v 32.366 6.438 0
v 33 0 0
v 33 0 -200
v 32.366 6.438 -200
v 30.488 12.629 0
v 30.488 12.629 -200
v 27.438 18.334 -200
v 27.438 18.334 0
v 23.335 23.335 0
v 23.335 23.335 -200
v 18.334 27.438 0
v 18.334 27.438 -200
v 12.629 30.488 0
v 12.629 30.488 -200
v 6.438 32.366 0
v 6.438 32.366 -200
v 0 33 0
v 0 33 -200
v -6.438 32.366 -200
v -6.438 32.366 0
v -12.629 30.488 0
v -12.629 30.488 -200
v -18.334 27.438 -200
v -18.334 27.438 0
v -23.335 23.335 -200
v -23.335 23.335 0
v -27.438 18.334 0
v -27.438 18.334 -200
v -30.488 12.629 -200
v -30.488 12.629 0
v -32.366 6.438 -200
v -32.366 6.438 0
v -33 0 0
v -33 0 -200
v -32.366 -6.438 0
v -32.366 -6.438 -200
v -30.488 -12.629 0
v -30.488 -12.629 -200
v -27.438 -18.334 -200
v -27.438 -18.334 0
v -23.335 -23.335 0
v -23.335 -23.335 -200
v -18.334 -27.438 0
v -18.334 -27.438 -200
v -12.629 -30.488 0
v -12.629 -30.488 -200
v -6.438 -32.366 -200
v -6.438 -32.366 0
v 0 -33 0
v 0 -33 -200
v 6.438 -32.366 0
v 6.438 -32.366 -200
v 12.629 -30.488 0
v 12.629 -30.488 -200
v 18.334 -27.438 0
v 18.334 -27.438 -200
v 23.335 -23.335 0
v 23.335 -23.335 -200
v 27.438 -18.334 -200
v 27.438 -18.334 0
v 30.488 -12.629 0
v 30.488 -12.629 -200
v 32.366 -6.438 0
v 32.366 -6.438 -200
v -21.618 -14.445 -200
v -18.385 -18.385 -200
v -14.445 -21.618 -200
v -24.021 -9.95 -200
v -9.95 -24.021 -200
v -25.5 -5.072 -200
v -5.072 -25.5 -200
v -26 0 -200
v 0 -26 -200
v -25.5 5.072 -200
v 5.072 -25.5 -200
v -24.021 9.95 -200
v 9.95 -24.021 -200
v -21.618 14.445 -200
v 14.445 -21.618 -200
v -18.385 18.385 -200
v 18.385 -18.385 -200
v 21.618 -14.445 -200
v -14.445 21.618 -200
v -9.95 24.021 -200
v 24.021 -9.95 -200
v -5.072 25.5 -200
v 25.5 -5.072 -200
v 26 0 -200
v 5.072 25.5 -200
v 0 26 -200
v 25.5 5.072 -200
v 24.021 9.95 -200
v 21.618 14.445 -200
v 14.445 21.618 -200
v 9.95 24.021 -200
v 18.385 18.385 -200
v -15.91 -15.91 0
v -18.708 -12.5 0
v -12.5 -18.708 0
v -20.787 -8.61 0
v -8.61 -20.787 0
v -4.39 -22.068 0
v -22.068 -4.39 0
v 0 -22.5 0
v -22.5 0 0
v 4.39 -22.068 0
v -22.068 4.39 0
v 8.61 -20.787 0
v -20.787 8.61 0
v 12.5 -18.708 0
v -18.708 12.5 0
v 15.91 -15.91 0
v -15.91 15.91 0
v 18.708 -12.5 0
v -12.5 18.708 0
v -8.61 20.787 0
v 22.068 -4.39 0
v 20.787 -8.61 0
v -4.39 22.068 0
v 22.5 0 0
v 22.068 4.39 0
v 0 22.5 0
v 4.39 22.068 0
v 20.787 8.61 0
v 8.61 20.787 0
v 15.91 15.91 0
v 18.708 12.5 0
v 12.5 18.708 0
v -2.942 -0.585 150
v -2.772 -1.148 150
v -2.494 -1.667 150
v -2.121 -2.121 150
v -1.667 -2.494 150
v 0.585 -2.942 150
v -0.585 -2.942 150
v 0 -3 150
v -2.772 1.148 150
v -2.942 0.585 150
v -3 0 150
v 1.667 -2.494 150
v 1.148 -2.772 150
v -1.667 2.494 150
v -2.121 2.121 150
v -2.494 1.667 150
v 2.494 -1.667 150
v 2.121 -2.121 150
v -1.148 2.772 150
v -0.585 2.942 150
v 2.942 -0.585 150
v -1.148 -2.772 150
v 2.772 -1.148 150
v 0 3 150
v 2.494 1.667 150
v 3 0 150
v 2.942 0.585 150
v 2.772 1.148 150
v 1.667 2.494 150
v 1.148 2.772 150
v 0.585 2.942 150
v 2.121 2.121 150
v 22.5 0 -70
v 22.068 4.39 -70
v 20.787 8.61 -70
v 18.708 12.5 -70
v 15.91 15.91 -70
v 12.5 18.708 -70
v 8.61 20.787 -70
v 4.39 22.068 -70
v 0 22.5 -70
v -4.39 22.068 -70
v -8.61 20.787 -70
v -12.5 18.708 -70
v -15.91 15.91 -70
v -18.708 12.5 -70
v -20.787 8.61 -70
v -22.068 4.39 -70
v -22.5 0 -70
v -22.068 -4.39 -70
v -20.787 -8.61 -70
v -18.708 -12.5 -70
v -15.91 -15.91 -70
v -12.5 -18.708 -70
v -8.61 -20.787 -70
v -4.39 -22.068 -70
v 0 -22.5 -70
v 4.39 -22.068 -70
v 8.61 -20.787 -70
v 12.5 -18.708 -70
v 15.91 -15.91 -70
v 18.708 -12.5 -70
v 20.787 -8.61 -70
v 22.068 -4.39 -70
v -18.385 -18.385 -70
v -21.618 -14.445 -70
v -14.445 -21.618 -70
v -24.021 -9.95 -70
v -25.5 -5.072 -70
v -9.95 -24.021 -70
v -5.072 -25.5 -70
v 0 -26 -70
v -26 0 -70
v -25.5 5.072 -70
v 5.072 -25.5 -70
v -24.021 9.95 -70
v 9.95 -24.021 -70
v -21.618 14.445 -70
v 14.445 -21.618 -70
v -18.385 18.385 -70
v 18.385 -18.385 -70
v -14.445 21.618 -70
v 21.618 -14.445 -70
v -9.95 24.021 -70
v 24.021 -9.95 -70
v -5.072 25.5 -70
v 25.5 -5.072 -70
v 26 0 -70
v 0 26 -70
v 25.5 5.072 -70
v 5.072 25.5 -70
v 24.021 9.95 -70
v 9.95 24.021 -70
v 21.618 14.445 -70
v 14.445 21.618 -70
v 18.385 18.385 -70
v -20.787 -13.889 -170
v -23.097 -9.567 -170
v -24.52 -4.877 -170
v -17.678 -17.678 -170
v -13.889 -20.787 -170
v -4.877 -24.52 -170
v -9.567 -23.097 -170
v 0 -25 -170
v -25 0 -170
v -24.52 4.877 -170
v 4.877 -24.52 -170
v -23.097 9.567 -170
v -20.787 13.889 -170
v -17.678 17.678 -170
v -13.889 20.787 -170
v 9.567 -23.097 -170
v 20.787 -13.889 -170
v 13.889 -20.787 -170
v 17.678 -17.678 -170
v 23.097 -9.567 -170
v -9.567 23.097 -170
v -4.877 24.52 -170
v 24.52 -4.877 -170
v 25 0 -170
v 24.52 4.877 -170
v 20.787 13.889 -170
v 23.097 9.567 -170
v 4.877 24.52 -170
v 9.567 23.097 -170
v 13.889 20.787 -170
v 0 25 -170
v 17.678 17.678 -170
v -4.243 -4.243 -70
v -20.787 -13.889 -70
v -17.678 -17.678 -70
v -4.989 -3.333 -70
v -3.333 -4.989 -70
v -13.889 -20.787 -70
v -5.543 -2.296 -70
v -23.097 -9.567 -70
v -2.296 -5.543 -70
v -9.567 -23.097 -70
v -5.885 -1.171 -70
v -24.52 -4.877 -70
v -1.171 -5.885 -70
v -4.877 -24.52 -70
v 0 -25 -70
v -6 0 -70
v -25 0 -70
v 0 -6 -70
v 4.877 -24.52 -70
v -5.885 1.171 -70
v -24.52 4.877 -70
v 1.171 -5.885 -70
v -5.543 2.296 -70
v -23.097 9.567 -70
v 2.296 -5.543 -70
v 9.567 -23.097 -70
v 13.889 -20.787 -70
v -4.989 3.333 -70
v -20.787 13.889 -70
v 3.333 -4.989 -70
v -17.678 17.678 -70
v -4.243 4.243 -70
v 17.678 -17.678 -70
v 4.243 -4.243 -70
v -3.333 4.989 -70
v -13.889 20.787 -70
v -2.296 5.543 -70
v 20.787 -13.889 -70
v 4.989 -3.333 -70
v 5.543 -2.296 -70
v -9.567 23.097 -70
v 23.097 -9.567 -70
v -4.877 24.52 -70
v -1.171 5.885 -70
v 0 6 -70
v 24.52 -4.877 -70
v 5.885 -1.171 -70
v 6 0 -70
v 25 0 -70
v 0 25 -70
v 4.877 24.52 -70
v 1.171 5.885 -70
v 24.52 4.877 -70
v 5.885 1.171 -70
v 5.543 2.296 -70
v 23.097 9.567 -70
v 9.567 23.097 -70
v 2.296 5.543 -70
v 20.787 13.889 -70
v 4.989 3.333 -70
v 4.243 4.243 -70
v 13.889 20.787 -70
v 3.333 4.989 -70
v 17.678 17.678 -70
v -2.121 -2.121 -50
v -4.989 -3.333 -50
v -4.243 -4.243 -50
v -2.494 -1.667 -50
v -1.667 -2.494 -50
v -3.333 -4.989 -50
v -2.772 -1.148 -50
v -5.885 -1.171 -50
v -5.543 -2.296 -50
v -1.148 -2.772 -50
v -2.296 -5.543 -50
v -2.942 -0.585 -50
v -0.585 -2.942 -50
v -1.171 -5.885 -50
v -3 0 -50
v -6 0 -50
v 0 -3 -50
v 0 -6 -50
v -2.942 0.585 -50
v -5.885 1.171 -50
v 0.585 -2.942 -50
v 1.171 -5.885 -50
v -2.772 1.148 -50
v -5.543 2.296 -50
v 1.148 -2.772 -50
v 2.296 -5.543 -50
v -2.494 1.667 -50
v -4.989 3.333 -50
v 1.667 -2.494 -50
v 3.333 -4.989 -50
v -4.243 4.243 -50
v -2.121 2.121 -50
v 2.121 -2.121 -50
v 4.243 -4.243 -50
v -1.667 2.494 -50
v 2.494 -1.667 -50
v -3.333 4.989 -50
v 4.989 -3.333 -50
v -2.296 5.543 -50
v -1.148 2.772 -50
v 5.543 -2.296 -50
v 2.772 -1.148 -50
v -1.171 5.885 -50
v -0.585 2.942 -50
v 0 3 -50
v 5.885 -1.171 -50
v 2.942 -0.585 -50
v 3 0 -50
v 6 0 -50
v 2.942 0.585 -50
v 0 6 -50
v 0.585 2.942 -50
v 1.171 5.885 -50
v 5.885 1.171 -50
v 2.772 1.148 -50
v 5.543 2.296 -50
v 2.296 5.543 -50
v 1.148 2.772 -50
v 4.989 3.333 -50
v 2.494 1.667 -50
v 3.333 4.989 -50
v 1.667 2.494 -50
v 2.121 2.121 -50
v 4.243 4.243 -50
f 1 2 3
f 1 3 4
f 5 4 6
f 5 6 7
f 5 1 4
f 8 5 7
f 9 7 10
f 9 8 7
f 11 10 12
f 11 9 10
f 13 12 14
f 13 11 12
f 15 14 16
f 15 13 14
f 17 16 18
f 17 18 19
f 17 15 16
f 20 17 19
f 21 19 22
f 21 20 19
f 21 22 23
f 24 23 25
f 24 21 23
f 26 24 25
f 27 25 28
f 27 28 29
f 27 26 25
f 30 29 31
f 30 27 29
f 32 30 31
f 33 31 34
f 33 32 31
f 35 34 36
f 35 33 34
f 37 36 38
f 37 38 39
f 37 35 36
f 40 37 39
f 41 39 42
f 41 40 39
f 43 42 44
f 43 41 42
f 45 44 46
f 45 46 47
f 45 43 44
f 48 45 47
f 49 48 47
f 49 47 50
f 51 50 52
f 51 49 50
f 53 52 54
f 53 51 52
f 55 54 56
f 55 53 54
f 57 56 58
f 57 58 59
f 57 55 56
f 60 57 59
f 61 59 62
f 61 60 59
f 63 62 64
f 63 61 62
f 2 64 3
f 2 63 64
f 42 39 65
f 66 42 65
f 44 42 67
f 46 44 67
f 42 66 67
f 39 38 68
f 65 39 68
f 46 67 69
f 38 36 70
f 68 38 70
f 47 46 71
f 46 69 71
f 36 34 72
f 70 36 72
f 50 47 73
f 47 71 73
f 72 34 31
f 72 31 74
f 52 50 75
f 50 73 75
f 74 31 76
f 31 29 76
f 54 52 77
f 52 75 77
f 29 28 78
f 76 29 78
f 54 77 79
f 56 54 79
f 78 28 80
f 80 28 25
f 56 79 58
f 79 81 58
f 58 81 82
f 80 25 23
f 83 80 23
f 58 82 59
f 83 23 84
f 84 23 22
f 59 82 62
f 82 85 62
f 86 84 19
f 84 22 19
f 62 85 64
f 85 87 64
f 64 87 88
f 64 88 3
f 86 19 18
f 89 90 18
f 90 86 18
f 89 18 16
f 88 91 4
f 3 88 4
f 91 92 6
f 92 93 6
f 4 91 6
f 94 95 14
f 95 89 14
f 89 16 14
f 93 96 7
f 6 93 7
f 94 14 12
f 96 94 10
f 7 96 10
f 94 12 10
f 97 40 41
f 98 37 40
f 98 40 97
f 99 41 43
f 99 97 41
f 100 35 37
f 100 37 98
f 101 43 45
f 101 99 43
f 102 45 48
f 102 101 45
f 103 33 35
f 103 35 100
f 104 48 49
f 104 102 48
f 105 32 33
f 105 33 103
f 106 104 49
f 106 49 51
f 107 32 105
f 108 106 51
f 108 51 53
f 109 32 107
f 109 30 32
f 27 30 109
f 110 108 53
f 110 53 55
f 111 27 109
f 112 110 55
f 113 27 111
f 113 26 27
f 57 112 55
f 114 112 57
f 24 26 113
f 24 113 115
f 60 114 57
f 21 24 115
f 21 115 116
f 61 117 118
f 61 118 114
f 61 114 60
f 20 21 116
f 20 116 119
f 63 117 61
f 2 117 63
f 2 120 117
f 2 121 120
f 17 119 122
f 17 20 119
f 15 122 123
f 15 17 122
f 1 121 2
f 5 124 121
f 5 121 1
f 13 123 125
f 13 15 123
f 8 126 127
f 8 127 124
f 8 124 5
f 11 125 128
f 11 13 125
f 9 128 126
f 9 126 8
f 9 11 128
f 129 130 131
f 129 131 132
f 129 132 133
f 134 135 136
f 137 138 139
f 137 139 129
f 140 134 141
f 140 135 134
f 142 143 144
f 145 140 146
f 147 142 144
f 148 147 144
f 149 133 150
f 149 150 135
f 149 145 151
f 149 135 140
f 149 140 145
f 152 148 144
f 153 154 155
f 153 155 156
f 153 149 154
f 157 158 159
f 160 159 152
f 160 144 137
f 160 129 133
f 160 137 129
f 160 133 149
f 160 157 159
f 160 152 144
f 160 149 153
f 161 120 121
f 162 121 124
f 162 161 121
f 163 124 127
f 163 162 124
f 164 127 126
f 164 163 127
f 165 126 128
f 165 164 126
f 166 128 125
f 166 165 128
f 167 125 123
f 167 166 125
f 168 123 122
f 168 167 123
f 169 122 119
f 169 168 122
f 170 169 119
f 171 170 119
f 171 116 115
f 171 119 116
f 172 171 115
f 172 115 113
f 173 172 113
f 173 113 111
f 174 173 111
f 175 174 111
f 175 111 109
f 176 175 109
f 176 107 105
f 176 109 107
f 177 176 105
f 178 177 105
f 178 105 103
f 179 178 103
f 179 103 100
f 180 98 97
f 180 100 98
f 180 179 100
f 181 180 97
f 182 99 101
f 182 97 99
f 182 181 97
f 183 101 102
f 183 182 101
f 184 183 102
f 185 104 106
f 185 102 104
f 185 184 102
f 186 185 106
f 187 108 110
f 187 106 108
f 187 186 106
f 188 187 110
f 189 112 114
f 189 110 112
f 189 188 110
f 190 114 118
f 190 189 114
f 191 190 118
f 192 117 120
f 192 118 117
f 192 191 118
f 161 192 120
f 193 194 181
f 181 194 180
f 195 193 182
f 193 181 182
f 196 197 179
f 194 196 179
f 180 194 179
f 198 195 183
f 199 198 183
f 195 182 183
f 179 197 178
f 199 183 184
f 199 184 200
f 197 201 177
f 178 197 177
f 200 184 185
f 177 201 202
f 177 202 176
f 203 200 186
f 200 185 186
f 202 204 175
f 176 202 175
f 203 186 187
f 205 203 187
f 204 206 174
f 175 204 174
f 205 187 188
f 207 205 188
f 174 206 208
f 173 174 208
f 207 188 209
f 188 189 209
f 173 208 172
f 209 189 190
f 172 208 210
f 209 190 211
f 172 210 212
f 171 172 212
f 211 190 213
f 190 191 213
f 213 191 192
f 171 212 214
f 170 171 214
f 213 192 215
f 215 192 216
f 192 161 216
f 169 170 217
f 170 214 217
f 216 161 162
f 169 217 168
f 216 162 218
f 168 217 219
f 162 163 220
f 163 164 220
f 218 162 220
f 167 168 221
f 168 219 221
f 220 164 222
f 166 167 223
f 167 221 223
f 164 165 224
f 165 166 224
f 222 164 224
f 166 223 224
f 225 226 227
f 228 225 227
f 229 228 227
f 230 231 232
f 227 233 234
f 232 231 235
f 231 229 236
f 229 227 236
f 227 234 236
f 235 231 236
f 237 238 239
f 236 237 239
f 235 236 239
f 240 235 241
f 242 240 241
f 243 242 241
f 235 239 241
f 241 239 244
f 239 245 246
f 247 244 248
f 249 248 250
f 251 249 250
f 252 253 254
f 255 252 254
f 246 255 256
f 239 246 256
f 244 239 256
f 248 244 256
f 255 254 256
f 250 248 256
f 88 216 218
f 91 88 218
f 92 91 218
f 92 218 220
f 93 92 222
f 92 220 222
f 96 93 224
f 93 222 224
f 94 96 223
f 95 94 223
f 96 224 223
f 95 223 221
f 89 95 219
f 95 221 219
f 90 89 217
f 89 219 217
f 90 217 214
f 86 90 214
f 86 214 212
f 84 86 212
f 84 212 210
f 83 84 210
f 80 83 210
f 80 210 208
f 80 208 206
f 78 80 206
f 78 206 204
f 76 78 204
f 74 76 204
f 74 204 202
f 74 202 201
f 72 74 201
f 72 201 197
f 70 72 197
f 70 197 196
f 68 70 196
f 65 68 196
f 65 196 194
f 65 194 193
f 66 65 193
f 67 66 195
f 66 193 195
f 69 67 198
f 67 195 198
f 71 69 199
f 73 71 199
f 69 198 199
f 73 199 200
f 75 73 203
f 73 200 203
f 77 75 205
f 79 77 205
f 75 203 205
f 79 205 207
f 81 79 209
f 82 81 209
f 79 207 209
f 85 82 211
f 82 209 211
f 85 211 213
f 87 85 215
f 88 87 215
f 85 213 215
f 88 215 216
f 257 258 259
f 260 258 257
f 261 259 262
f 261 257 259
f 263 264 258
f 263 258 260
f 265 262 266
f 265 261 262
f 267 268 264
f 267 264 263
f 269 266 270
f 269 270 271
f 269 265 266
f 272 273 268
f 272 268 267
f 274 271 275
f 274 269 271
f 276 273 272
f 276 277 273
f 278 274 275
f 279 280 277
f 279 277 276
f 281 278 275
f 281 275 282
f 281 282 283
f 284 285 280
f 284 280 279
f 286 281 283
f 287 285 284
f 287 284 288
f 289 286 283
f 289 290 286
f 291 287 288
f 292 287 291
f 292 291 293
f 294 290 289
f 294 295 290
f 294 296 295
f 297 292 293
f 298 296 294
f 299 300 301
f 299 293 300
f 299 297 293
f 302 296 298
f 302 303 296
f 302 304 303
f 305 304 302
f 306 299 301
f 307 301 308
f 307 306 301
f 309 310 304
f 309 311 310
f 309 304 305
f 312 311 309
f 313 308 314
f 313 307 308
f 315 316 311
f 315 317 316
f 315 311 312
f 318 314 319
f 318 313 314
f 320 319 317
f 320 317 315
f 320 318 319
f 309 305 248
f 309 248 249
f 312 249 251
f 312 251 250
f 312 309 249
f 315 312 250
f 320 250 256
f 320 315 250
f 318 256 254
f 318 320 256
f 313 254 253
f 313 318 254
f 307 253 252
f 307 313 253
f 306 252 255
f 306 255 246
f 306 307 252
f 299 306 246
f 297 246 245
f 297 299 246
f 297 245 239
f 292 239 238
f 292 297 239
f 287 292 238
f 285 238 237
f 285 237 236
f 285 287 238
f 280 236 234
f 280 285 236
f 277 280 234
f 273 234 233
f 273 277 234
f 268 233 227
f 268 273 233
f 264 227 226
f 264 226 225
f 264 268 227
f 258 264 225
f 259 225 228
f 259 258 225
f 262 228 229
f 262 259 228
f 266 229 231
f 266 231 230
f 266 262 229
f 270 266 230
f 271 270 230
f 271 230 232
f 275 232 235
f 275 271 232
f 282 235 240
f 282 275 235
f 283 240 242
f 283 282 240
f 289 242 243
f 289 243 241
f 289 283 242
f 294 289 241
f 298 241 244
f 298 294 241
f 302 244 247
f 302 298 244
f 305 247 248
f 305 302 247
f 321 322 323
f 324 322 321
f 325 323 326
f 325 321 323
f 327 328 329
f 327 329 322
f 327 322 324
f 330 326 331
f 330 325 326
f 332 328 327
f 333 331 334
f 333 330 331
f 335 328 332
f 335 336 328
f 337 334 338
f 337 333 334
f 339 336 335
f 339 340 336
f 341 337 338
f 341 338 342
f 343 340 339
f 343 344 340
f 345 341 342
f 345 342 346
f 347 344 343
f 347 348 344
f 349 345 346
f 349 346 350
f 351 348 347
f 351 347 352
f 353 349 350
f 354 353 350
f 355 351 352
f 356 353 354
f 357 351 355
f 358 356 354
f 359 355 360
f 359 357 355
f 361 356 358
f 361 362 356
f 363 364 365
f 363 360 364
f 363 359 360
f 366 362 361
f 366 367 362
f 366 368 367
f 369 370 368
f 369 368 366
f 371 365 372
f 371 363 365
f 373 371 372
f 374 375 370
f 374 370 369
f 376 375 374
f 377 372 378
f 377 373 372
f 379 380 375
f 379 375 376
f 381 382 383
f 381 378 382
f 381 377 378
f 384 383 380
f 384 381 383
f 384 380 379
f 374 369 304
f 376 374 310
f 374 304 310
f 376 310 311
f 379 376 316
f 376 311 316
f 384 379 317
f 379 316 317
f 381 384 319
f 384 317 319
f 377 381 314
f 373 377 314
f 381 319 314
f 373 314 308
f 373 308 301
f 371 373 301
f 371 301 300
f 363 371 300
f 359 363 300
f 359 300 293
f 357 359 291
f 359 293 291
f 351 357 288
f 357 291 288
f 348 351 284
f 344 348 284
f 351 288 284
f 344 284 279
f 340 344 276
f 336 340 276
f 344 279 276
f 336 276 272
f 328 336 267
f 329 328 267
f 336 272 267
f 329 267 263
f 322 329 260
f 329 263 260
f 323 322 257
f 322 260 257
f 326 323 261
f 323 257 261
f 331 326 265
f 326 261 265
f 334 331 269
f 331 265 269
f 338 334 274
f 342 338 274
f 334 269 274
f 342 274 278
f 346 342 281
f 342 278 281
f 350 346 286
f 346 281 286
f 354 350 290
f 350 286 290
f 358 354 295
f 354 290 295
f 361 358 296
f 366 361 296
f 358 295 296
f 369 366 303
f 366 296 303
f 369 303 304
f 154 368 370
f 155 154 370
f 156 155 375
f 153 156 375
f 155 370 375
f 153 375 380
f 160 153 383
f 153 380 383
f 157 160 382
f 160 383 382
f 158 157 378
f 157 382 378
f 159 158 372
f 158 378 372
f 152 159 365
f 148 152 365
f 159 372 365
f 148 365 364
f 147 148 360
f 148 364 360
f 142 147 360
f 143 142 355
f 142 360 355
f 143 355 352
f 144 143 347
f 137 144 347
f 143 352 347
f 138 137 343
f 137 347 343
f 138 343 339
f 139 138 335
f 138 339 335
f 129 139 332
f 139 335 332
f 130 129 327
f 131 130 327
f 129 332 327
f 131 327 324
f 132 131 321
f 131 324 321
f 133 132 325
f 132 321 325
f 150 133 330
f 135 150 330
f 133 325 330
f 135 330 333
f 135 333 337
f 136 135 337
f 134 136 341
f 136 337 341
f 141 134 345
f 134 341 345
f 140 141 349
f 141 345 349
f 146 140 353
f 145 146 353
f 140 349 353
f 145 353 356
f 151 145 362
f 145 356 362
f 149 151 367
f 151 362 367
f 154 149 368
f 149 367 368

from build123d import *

# Parameters (mm, degrees)
F0_R      = 33
F1_DEPTH  = 200
F3_R      = 22.5
F4_DEPTH  = 70.001
F5_R      = 26
F6_DEPTH  = 130.001
F7_R      = 25
F8_DEPTH  = 100
F9_R      = 6
F10_DEPTH = 20
F11_R     = 3
F12_DEPTH = 200


with BuildPart() as f1:
    # F0 (on Top) → F1 (new body)
    with BuildSketch(Plane.XY):
        Circle(F0_R)
    extrude(amount=-F1_DEPTH)

    # F3 (on offset) → F4 (cut, through all)
    with BuildSketch(Plane.XY.offset(-70)):
        Circle(F3_R)
    extrude(amount=F4_DEPTH, mode=Mode.SUBTRACT)

    # F5 (on offset) → F6 (cut, through all)
    with BuildSketch(Plane.XY.offset(-70)):
        Circle(F5_R)
    extrude(amount=-F6_DEPTH, mode=Mode.SUBTRACT)


with BuildPart() as f8:
    # F7 (on offset) → F8 (new body)
    with BuildSketch(Plane.XY.offset(-70)):
        Circle(F7_R)
    extrude(amount=-F8_DEPTH)

    # F9 (on face) → F10 (join)
    with BuildSketch(Plane.XY.offset(-70)):
        Circle(F9_R)
    extrude(amount=F10_DEPTH)

    # F11 (on face) → F12 (join)
    with BuildSketch(Plane.XY.offset(-50)):
        Circle(F11_R)
    extrude(amount=F12_DEPTH)


solid = Compound([f1.part, f8.part])
